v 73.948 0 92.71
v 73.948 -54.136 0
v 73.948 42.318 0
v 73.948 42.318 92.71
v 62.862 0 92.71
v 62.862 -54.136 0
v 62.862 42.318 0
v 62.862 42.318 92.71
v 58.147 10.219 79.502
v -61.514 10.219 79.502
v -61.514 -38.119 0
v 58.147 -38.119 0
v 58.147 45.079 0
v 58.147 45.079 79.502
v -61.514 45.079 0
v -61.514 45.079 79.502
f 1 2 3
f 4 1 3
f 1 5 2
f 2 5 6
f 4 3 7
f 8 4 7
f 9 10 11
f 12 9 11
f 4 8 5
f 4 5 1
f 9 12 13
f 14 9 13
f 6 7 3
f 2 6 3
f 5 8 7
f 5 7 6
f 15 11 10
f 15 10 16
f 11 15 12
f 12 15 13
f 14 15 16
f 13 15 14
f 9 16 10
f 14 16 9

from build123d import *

# Parameters (mm, degrees)
F0_W     = 119.6608580649
F0_H     = 94.0911695361
F1_DEPTH = 79.502
F3_DEPTH = 92.71
F5_DEPTH = 135.4624384472
F7_DEPTH = 11.086793376


with BuildPart() as f1:
    # F0 (on Top) → F1 (new body)
    with BuildSketch(Plane.XY):
        with Locations((-1.6834978014, -1.9669607282)):
            Rectangle(F0_W, F0_H)
    extrude(amount=F1_DEPTH)

    # F4 (on face) → F5 (cut, through all)
    with BuildSketch(Plane(origin=(-61.5139268339, 0, 0), x_dir=(0, -1, 0), z_dir=(-1, 0, 0))):
        Polygon((-10.2190570906, 79.502), (38.1188131869, 0), (49.0125454962, 0), (49.0125454962, 5.3254961967), (49.0125454962, 79.502), align=None)
    extrude(amount=-F5_DEPTH, mode=Mode.SUBTRACT)


with BuildPart() as f3:
    # F2 (on Top) → F3 (new body)
    with BuildSketch(Plane.XY):
        Polygon((73.9475116134, 42.3180349171), (62.8617182374, 42.3180349171), (62.8617182374, -52.922450006), (62.8617182374, -60.81943959), (73.9475116134, -60.81943959), align=None)
    extrude(amount=F3_DEPTH)

    # F6 (on face) → F7 (cut, through all)
    with BuildSketch(Plane(origin=(62.8617182374, 0, 0), x_dir=(0, -1, 0), z_dir=(-1, 0, 0))):
        Polygon((0, 92.71), (54.1358701885, 0), (60.81943959, 0), (60.81943959, 92.71), align=None)
    extrude(amount=-F7_DEPTH, mode=Mode.SUBTRACT)


solid = Compound([f1.part, f3.part])
